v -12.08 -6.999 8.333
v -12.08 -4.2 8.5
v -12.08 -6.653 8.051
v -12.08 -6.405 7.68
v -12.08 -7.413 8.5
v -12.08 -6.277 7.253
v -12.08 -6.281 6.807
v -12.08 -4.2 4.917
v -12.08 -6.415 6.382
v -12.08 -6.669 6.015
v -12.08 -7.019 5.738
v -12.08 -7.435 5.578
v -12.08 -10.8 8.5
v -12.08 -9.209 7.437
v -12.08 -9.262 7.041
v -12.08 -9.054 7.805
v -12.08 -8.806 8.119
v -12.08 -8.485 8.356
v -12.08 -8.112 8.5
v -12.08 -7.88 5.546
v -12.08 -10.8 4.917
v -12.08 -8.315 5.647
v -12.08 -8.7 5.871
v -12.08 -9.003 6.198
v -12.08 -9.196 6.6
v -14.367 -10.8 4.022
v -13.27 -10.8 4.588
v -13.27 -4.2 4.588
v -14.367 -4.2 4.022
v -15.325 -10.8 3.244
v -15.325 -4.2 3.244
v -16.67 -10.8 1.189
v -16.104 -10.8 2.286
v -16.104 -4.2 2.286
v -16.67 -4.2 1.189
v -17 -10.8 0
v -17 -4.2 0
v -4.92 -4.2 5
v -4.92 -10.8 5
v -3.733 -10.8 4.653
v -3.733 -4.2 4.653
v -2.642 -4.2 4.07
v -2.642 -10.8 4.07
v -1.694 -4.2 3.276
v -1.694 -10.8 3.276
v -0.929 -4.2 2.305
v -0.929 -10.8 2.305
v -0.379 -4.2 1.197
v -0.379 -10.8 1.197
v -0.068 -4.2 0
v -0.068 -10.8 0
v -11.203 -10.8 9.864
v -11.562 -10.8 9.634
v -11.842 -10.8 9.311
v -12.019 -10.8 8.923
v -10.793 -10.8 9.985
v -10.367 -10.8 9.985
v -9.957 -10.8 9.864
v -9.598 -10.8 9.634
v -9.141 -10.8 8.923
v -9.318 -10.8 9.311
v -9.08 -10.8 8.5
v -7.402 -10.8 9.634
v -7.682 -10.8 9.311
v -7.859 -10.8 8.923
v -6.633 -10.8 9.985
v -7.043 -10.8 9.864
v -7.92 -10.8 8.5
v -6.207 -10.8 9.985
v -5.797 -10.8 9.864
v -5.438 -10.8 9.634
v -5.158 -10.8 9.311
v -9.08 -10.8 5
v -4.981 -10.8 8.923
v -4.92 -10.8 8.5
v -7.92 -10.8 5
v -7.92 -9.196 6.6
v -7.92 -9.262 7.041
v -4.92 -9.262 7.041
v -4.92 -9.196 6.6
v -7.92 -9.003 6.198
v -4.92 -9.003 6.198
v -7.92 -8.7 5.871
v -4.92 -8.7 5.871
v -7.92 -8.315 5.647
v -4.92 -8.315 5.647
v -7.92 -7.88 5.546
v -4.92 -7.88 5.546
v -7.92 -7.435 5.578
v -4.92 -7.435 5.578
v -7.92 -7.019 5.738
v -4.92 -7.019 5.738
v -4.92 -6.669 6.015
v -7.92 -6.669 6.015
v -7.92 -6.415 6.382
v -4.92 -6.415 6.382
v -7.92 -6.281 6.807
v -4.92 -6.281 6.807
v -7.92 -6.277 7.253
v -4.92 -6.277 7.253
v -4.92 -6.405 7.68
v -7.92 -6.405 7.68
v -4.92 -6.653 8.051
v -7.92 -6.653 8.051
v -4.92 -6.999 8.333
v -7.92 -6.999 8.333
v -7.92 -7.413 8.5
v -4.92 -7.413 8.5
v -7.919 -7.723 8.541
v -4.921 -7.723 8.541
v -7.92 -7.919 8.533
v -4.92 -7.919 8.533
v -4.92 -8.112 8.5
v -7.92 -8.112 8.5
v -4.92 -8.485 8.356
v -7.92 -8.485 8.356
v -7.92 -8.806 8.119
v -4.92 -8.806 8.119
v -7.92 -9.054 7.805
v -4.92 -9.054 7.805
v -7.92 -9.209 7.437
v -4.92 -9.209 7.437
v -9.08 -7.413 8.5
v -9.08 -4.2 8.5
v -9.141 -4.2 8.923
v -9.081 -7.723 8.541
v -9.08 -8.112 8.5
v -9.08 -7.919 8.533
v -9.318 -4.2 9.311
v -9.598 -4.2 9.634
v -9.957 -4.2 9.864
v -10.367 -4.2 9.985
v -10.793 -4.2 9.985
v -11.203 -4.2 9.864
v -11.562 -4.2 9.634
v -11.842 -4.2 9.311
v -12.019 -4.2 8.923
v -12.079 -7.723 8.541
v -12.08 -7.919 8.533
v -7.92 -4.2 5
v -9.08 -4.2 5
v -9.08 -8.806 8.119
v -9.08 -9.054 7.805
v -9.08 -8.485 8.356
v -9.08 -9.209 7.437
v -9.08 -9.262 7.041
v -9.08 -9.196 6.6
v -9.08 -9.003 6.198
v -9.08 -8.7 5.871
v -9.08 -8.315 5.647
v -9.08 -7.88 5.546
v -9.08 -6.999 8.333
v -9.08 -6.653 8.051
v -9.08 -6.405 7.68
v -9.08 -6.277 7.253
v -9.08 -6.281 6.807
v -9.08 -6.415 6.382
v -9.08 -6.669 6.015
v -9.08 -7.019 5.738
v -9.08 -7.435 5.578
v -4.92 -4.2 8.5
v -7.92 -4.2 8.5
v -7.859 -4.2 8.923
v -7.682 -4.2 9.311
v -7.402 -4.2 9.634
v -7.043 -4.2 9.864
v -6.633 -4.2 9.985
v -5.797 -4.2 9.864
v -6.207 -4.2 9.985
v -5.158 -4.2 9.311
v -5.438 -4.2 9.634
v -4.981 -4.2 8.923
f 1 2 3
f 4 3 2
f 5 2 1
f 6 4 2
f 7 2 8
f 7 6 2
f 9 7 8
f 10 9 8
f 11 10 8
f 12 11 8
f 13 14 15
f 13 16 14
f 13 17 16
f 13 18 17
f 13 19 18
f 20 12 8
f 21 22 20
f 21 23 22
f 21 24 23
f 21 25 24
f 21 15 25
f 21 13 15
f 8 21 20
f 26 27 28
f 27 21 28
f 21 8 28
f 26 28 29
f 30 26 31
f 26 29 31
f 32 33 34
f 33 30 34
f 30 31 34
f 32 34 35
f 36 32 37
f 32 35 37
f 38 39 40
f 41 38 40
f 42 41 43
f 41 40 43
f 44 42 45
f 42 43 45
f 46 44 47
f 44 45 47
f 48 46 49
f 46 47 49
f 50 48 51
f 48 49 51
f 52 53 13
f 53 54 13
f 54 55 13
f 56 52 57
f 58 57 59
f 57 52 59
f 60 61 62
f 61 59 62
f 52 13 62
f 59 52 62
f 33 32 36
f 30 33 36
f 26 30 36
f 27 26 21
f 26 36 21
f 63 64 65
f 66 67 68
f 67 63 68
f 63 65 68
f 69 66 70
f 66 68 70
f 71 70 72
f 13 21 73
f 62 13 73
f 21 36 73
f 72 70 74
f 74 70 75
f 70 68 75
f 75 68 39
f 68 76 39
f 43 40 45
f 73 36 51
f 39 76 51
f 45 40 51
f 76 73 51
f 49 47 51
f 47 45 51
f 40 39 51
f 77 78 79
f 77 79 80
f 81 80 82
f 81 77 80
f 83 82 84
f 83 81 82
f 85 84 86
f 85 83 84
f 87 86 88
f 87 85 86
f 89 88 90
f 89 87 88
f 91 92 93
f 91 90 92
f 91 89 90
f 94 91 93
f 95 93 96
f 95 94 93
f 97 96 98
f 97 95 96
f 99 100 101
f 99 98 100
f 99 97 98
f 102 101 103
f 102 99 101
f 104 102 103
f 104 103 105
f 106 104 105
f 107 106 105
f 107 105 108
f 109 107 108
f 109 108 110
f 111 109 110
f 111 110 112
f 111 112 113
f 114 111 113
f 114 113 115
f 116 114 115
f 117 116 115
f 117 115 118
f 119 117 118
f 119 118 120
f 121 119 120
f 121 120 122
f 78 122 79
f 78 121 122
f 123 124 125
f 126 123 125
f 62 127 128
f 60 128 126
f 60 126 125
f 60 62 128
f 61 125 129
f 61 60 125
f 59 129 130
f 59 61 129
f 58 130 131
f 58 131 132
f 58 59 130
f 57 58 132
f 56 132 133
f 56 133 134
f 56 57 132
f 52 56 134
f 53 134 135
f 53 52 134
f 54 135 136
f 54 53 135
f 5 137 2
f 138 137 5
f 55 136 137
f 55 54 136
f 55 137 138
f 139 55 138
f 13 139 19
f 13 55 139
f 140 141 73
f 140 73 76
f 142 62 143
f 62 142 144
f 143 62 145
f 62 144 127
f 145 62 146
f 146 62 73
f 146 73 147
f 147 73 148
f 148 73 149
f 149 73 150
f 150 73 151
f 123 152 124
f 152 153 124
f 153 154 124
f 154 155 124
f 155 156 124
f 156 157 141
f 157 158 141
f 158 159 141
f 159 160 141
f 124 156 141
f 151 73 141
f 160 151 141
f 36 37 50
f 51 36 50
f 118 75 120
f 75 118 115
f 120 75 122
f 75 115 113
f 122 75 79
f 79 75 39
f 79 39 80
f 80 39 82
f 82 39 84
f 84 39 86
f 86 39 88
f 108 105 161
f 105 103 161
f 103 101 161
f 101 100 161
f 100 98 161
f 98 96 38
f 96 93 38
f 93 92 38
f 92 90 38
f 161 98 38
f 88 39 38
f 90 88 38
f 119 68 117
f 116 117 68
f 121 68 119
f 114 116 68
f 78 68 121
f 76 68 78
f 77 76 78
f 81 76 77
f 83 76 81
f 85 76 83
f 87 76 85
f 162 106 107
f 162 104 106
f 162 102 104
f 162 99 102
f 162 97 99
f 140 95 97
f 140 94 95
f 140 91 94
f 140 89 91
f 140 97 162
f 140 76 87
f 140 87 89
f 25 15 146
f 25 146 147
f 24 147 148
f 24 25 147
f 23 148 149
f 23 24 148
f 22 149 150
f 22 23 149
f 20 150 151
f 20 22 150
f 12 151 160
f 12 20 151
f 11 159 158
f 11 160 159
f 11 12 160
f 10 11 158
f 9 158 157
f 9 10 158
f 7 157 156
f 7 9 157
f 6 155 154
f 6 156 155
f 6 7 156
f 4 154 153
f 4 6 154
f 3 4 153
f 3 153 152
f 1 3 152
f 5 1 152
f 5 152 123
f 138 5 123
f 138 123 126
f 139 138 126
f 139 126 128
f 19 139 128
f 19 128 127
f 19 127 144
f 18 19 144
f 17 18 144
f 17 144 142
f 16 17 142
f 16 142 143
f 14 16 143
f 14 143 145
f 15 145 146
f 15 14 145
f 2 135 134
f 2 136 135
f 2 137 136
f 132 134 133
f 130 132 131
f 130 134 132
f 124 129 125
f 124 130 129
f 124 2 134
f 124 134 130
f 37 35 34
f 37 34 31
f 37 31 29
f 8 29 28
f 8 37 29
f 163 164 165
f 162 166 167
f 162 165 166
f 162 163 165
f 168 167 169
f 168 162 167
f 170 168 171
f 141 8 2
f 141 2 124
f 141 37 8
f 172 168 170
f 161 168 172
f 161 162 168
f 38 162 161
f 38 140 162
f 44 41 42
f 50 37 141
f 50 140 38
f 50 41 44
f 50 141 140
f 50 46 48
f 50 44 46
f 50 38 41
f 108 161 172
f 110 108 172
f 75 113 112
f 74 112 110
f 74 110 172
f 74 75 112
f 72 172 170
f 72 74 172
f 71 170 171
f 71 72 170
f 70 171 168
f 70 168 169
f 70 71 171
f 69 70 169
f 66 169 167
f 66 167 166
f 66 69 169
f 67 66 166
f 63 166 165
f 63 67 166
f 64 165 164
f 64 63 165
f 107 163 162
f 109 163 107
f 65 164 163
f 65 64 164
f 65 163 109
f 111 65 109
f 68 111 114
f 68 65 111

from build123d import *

# Parameters (mm, degrees)
SKETCH1_W               = 17
SKETCH1_H               = 15
BOSS_EXTRUDE1_DEPTH     = 5
SKETCH2_W               = 3
SKETCH2_H               = 15
SKETCH2_H_2             = 14.97636143
BOSS_EXTRUDE2_DEPTH     = 5
CUT_EXTRUDE2_DEPTH      = 21.185301583
CUT_EXTRUDE2_DEPTH_BACK = 21.185301583
SKETCH4_R               = 1.5
FILLET1_R               = 6
FILLET3_RADIUS          = 1.5
FILLET3_LENGTH          = 14.97636143
FILLET4_RADIUS          = 1.5
FILLET4_LENGTH          = 15
SKETCH5_W               = 17
SKETCH5_H               = 4.2
SKETCH5_W_2             = 16.931812254
CUT_EXTRUDE3_DEPTH      = 14


with BuildPart() as part:
    # Sketch1 → Boss-Extrude1 (new body)
    with BuildSketch(Plane.XY):
        with Locations((-8.5, -7.5)):
            Rectangle(SKETCH1_W, SKETCH1_H)
    extrude(amount=BOSS_EXTRUDE1_DEPTH)

    # Sketch2 → Boss-Extrude2 (add)
    with BuildSketch(Plane.XY.offset(5)):
        with Locations((-6.42, -7.5)):
            Rectangle(SKETCH2_W, SKETCH2_H)
        with Locations((-10.58, -7.511819285)):
            Rectangle(SKETCH2_W, SKETCH2_H_2)
    extrude(amount=BOSS_EXTRUDE2_DEPTH)

    # Sketch4 → Cut-Extrude2 (cut, two sides: drawn at the far end of the back side and taken through both)
    with BuildSketch(Plane(origin=(-9.08, 0, 0), x_dir=(0, 0, -1), z_dir=(1, 0, 0)).offset(-CUT_EXTRUDE2_DEPTH_BACK)):
        with Locations(Location((-7.041389116, -7.762480296, 0), (0, 0, 270))):
            Circle(SKETCH4_R)
    extrude(amount=CUT_EXTRUDE2_DEPTH + CUT_EXTRUDE2_DEPTH_BACK, mode=Mode.SUBTRACT)

    # Fillet1
    # the kernel refuses this fillet: 6 mm, written as the material it takes off along each edge
    with BuildSketch(Plane(origin=(0, -29.754999153, 5), x_dir=(0, 0, -1), z_dir=(0, 1, 0))) as fillet1_piece_1:
        with BuildLine():
            CenterArc((5.901999661, 6), FILLET1_R, 190.369759805, 79.630240195)
            Line((0, 4.92), (0, 0))
            Line((0, 0), (5.901999661, 0))
        make_face()
    extrude(amount=44.509998306, mode=Mode.SUBTRACT)
    # the kernel refuses this fillet: 6 mm, written as the material it takes off along each edge
    with BuildSketch(Plane(origin=(-17, 14.790199458, 5), x_dir=(0, 0, -1), z_dir=(0, -1, 0))) as fillet1_2_piece_1_section:
        with BuildLine():
            CenterArc((6, 5.916079783), FILLET1_R, 180, 80.405931773)
            Line((0, 5.916079783), (0, 0))
            Line((0, 0), (5, 0))
        make_face()
    fillet1_2_piece_1 = extrude(amount=44.580398916, mode=Mode.PRIVATE)
    fillet1_2_piece_1 = split(fillet1_2_piece_1, bisect_by=Plane(origin=(-17, -0.02363857, 5), z_dir=(0, 1, 0)), keep=Keep.TOP, mode=Mode.PRIVATE)
    fillet1_2_piece_1 = split(fillet1_2_piece_1, bisect_by=Plane(origin=(-12.08, 14.790199458, 5), z_dir=(-1, 0, 0)), keep=Keep.TOP, mode=Mode.PRIVATE)
    add(fillet1_2_piece_1, mode=Mode.SUBTRACT)
    with BuildSketch(Plane(origin=(-17, 14.790199458, 5), x_dir=(0, 0, -1), z_dir=(0, -1, 0))) as fillet1_2_piece_2_section:
        with BuildLine():
            CenterArc((6, 5.916079783), FILLET1_R, 180, 80.405931773)
            Line((0, 5.916079783), (0, 0))
            Line((0, 0), (5, 0))
        make_face()
    fillet1_2_piece_2 = extrude(amount=44.580398916, mode=Mode.PRIVATE)
    fillet1_2_piece_2 = split(fillet1_2_piece_2, bisect_by=Plane(origin=(-17, -0.02363857, 5), z_dir=(0, 1, 0)), keep=Keep.TOP, mode=Mode.PRIVATE)
    fillet1_2_piece_2 = split(fillet1_2_piece_2, bisect_by=Plane(origin=(-12.08, 14.790199458, 5), z_dir=(1, 0, 0)), keep=Keep.TOP, mode=Mode.PRIVATE)
    add(fillet1_2_piece_2, mode=Mode.SUBTRACT)
    with BuildSketch(Plane(origin=(-17, 14.790199458, 5), x_dir=(0, 0, -1), z_dir=(0, -1, 0))) as fillet1_2_piece_3_section:
        with BuildLine():
            CenterArc((6, 5.916079783), FILLET1_R, 180, 80.405931773)
            Line((0, 5.916079783), (0, 0))
            Line((0, 0), (5, 0))
        make_face()
    fillet1_2_piece_3 = extrude(amount=44.580398916, mode=Mode.PRIVATE)
    fillet1_2_piece_3 = split(fillet1_2_piece_3, bisect_by=Plane(origin=(-17, -0.02363857, 5), z_dir=(0, -1, 0)), keep=Keep.TOP, mode=Mode.PRIVATE)
    fillet1_2_piece_3 = split(fillet1_2_piece_3, bisect_by=Plane(origin=(-12.08, 14.790199458, 5), z_dir=(-1, 0, 0)), keep=Keep.TOP, mode=Mode.PRIVATE)
    add(fillet1_2_piece_3, mode=Mode.SUBTRACT)

    # Fillet3: full round fillet: the end face becomes a half cylinder, R = half its width
    fillet3_face = Plane((-10.58, -7.511819285, 10), x_dir=(0, -1, 0), z_dir=(0, 0, 1))  # on the end face: x along it, z out of the body
    fillet3_slab = fillet3_face.offset(-FILLET3_RADIUS / 2) * Box(FILLET3_LENGTH, 2 * FILLET3_RADIUS, FILLET3_RADIUS, mode=Mode.PRIVATE)  # the body's end, R deep
    fillet3_round = Plane((-10.58, -7.511819285, 8.5), x_dir=(0, 0, 1), z_dir=(0, -1, 0)) * Cylinder(FILLET3_RADIUS, FILLET3_LENGTH, mode=Mode.PRIVATE)  # its axis R under the face
    add(fillet3_slab - fillet3_round, mode=Mode.SUBTRACT)

    # Fillet4: full round fillet: the end face becomes a half cylinder, R = half its width
    fillet4_face = Plane((-6.42, -7.5, 10), x_dir=(0, -1, 0), z_dir=(0, 0, 1))  # on the end face: x along it, z out of the body
    fillet4_slab = fillet4_face.offset(-FILLET4_RADIUS / 2) * Box(FILLET4_LENGTH, 2 * FILLET4_RADIUS, FILLET4_RADIUS, mode=Mode.PRIVATE)  # the body's end, R deep
    fillet4_round = Plane((-6.42, -7.5, 8.5), x_dir=(0, 0, 1), z_dir=(0, -1, 0)) * Cylinder(FILLET4_RADIUS, FILLET4_LENGTH, mode=Mode.PRIVATE)  # its axis R under the face
    add(fillet4_slab - fillet4_round, mode=Mode.SUBTRACT)

    # Sketch5 → Cut-Extrude3 (cut)
    with BuildSketch(Plane.XY):
        with Locations((-8.5, -2.1)):
            Rectangle(SKETCH5_W, SKETCH5_H)
        with Locations((-8.534093873, -12.9)):
            Rectangle(SKETCH5_W_2, SKETCH5_H)
    extrude(amount=CUT_EXTRUDE3_DEPTH, mode=Mode.SUBTRACT)


solid = part.part
